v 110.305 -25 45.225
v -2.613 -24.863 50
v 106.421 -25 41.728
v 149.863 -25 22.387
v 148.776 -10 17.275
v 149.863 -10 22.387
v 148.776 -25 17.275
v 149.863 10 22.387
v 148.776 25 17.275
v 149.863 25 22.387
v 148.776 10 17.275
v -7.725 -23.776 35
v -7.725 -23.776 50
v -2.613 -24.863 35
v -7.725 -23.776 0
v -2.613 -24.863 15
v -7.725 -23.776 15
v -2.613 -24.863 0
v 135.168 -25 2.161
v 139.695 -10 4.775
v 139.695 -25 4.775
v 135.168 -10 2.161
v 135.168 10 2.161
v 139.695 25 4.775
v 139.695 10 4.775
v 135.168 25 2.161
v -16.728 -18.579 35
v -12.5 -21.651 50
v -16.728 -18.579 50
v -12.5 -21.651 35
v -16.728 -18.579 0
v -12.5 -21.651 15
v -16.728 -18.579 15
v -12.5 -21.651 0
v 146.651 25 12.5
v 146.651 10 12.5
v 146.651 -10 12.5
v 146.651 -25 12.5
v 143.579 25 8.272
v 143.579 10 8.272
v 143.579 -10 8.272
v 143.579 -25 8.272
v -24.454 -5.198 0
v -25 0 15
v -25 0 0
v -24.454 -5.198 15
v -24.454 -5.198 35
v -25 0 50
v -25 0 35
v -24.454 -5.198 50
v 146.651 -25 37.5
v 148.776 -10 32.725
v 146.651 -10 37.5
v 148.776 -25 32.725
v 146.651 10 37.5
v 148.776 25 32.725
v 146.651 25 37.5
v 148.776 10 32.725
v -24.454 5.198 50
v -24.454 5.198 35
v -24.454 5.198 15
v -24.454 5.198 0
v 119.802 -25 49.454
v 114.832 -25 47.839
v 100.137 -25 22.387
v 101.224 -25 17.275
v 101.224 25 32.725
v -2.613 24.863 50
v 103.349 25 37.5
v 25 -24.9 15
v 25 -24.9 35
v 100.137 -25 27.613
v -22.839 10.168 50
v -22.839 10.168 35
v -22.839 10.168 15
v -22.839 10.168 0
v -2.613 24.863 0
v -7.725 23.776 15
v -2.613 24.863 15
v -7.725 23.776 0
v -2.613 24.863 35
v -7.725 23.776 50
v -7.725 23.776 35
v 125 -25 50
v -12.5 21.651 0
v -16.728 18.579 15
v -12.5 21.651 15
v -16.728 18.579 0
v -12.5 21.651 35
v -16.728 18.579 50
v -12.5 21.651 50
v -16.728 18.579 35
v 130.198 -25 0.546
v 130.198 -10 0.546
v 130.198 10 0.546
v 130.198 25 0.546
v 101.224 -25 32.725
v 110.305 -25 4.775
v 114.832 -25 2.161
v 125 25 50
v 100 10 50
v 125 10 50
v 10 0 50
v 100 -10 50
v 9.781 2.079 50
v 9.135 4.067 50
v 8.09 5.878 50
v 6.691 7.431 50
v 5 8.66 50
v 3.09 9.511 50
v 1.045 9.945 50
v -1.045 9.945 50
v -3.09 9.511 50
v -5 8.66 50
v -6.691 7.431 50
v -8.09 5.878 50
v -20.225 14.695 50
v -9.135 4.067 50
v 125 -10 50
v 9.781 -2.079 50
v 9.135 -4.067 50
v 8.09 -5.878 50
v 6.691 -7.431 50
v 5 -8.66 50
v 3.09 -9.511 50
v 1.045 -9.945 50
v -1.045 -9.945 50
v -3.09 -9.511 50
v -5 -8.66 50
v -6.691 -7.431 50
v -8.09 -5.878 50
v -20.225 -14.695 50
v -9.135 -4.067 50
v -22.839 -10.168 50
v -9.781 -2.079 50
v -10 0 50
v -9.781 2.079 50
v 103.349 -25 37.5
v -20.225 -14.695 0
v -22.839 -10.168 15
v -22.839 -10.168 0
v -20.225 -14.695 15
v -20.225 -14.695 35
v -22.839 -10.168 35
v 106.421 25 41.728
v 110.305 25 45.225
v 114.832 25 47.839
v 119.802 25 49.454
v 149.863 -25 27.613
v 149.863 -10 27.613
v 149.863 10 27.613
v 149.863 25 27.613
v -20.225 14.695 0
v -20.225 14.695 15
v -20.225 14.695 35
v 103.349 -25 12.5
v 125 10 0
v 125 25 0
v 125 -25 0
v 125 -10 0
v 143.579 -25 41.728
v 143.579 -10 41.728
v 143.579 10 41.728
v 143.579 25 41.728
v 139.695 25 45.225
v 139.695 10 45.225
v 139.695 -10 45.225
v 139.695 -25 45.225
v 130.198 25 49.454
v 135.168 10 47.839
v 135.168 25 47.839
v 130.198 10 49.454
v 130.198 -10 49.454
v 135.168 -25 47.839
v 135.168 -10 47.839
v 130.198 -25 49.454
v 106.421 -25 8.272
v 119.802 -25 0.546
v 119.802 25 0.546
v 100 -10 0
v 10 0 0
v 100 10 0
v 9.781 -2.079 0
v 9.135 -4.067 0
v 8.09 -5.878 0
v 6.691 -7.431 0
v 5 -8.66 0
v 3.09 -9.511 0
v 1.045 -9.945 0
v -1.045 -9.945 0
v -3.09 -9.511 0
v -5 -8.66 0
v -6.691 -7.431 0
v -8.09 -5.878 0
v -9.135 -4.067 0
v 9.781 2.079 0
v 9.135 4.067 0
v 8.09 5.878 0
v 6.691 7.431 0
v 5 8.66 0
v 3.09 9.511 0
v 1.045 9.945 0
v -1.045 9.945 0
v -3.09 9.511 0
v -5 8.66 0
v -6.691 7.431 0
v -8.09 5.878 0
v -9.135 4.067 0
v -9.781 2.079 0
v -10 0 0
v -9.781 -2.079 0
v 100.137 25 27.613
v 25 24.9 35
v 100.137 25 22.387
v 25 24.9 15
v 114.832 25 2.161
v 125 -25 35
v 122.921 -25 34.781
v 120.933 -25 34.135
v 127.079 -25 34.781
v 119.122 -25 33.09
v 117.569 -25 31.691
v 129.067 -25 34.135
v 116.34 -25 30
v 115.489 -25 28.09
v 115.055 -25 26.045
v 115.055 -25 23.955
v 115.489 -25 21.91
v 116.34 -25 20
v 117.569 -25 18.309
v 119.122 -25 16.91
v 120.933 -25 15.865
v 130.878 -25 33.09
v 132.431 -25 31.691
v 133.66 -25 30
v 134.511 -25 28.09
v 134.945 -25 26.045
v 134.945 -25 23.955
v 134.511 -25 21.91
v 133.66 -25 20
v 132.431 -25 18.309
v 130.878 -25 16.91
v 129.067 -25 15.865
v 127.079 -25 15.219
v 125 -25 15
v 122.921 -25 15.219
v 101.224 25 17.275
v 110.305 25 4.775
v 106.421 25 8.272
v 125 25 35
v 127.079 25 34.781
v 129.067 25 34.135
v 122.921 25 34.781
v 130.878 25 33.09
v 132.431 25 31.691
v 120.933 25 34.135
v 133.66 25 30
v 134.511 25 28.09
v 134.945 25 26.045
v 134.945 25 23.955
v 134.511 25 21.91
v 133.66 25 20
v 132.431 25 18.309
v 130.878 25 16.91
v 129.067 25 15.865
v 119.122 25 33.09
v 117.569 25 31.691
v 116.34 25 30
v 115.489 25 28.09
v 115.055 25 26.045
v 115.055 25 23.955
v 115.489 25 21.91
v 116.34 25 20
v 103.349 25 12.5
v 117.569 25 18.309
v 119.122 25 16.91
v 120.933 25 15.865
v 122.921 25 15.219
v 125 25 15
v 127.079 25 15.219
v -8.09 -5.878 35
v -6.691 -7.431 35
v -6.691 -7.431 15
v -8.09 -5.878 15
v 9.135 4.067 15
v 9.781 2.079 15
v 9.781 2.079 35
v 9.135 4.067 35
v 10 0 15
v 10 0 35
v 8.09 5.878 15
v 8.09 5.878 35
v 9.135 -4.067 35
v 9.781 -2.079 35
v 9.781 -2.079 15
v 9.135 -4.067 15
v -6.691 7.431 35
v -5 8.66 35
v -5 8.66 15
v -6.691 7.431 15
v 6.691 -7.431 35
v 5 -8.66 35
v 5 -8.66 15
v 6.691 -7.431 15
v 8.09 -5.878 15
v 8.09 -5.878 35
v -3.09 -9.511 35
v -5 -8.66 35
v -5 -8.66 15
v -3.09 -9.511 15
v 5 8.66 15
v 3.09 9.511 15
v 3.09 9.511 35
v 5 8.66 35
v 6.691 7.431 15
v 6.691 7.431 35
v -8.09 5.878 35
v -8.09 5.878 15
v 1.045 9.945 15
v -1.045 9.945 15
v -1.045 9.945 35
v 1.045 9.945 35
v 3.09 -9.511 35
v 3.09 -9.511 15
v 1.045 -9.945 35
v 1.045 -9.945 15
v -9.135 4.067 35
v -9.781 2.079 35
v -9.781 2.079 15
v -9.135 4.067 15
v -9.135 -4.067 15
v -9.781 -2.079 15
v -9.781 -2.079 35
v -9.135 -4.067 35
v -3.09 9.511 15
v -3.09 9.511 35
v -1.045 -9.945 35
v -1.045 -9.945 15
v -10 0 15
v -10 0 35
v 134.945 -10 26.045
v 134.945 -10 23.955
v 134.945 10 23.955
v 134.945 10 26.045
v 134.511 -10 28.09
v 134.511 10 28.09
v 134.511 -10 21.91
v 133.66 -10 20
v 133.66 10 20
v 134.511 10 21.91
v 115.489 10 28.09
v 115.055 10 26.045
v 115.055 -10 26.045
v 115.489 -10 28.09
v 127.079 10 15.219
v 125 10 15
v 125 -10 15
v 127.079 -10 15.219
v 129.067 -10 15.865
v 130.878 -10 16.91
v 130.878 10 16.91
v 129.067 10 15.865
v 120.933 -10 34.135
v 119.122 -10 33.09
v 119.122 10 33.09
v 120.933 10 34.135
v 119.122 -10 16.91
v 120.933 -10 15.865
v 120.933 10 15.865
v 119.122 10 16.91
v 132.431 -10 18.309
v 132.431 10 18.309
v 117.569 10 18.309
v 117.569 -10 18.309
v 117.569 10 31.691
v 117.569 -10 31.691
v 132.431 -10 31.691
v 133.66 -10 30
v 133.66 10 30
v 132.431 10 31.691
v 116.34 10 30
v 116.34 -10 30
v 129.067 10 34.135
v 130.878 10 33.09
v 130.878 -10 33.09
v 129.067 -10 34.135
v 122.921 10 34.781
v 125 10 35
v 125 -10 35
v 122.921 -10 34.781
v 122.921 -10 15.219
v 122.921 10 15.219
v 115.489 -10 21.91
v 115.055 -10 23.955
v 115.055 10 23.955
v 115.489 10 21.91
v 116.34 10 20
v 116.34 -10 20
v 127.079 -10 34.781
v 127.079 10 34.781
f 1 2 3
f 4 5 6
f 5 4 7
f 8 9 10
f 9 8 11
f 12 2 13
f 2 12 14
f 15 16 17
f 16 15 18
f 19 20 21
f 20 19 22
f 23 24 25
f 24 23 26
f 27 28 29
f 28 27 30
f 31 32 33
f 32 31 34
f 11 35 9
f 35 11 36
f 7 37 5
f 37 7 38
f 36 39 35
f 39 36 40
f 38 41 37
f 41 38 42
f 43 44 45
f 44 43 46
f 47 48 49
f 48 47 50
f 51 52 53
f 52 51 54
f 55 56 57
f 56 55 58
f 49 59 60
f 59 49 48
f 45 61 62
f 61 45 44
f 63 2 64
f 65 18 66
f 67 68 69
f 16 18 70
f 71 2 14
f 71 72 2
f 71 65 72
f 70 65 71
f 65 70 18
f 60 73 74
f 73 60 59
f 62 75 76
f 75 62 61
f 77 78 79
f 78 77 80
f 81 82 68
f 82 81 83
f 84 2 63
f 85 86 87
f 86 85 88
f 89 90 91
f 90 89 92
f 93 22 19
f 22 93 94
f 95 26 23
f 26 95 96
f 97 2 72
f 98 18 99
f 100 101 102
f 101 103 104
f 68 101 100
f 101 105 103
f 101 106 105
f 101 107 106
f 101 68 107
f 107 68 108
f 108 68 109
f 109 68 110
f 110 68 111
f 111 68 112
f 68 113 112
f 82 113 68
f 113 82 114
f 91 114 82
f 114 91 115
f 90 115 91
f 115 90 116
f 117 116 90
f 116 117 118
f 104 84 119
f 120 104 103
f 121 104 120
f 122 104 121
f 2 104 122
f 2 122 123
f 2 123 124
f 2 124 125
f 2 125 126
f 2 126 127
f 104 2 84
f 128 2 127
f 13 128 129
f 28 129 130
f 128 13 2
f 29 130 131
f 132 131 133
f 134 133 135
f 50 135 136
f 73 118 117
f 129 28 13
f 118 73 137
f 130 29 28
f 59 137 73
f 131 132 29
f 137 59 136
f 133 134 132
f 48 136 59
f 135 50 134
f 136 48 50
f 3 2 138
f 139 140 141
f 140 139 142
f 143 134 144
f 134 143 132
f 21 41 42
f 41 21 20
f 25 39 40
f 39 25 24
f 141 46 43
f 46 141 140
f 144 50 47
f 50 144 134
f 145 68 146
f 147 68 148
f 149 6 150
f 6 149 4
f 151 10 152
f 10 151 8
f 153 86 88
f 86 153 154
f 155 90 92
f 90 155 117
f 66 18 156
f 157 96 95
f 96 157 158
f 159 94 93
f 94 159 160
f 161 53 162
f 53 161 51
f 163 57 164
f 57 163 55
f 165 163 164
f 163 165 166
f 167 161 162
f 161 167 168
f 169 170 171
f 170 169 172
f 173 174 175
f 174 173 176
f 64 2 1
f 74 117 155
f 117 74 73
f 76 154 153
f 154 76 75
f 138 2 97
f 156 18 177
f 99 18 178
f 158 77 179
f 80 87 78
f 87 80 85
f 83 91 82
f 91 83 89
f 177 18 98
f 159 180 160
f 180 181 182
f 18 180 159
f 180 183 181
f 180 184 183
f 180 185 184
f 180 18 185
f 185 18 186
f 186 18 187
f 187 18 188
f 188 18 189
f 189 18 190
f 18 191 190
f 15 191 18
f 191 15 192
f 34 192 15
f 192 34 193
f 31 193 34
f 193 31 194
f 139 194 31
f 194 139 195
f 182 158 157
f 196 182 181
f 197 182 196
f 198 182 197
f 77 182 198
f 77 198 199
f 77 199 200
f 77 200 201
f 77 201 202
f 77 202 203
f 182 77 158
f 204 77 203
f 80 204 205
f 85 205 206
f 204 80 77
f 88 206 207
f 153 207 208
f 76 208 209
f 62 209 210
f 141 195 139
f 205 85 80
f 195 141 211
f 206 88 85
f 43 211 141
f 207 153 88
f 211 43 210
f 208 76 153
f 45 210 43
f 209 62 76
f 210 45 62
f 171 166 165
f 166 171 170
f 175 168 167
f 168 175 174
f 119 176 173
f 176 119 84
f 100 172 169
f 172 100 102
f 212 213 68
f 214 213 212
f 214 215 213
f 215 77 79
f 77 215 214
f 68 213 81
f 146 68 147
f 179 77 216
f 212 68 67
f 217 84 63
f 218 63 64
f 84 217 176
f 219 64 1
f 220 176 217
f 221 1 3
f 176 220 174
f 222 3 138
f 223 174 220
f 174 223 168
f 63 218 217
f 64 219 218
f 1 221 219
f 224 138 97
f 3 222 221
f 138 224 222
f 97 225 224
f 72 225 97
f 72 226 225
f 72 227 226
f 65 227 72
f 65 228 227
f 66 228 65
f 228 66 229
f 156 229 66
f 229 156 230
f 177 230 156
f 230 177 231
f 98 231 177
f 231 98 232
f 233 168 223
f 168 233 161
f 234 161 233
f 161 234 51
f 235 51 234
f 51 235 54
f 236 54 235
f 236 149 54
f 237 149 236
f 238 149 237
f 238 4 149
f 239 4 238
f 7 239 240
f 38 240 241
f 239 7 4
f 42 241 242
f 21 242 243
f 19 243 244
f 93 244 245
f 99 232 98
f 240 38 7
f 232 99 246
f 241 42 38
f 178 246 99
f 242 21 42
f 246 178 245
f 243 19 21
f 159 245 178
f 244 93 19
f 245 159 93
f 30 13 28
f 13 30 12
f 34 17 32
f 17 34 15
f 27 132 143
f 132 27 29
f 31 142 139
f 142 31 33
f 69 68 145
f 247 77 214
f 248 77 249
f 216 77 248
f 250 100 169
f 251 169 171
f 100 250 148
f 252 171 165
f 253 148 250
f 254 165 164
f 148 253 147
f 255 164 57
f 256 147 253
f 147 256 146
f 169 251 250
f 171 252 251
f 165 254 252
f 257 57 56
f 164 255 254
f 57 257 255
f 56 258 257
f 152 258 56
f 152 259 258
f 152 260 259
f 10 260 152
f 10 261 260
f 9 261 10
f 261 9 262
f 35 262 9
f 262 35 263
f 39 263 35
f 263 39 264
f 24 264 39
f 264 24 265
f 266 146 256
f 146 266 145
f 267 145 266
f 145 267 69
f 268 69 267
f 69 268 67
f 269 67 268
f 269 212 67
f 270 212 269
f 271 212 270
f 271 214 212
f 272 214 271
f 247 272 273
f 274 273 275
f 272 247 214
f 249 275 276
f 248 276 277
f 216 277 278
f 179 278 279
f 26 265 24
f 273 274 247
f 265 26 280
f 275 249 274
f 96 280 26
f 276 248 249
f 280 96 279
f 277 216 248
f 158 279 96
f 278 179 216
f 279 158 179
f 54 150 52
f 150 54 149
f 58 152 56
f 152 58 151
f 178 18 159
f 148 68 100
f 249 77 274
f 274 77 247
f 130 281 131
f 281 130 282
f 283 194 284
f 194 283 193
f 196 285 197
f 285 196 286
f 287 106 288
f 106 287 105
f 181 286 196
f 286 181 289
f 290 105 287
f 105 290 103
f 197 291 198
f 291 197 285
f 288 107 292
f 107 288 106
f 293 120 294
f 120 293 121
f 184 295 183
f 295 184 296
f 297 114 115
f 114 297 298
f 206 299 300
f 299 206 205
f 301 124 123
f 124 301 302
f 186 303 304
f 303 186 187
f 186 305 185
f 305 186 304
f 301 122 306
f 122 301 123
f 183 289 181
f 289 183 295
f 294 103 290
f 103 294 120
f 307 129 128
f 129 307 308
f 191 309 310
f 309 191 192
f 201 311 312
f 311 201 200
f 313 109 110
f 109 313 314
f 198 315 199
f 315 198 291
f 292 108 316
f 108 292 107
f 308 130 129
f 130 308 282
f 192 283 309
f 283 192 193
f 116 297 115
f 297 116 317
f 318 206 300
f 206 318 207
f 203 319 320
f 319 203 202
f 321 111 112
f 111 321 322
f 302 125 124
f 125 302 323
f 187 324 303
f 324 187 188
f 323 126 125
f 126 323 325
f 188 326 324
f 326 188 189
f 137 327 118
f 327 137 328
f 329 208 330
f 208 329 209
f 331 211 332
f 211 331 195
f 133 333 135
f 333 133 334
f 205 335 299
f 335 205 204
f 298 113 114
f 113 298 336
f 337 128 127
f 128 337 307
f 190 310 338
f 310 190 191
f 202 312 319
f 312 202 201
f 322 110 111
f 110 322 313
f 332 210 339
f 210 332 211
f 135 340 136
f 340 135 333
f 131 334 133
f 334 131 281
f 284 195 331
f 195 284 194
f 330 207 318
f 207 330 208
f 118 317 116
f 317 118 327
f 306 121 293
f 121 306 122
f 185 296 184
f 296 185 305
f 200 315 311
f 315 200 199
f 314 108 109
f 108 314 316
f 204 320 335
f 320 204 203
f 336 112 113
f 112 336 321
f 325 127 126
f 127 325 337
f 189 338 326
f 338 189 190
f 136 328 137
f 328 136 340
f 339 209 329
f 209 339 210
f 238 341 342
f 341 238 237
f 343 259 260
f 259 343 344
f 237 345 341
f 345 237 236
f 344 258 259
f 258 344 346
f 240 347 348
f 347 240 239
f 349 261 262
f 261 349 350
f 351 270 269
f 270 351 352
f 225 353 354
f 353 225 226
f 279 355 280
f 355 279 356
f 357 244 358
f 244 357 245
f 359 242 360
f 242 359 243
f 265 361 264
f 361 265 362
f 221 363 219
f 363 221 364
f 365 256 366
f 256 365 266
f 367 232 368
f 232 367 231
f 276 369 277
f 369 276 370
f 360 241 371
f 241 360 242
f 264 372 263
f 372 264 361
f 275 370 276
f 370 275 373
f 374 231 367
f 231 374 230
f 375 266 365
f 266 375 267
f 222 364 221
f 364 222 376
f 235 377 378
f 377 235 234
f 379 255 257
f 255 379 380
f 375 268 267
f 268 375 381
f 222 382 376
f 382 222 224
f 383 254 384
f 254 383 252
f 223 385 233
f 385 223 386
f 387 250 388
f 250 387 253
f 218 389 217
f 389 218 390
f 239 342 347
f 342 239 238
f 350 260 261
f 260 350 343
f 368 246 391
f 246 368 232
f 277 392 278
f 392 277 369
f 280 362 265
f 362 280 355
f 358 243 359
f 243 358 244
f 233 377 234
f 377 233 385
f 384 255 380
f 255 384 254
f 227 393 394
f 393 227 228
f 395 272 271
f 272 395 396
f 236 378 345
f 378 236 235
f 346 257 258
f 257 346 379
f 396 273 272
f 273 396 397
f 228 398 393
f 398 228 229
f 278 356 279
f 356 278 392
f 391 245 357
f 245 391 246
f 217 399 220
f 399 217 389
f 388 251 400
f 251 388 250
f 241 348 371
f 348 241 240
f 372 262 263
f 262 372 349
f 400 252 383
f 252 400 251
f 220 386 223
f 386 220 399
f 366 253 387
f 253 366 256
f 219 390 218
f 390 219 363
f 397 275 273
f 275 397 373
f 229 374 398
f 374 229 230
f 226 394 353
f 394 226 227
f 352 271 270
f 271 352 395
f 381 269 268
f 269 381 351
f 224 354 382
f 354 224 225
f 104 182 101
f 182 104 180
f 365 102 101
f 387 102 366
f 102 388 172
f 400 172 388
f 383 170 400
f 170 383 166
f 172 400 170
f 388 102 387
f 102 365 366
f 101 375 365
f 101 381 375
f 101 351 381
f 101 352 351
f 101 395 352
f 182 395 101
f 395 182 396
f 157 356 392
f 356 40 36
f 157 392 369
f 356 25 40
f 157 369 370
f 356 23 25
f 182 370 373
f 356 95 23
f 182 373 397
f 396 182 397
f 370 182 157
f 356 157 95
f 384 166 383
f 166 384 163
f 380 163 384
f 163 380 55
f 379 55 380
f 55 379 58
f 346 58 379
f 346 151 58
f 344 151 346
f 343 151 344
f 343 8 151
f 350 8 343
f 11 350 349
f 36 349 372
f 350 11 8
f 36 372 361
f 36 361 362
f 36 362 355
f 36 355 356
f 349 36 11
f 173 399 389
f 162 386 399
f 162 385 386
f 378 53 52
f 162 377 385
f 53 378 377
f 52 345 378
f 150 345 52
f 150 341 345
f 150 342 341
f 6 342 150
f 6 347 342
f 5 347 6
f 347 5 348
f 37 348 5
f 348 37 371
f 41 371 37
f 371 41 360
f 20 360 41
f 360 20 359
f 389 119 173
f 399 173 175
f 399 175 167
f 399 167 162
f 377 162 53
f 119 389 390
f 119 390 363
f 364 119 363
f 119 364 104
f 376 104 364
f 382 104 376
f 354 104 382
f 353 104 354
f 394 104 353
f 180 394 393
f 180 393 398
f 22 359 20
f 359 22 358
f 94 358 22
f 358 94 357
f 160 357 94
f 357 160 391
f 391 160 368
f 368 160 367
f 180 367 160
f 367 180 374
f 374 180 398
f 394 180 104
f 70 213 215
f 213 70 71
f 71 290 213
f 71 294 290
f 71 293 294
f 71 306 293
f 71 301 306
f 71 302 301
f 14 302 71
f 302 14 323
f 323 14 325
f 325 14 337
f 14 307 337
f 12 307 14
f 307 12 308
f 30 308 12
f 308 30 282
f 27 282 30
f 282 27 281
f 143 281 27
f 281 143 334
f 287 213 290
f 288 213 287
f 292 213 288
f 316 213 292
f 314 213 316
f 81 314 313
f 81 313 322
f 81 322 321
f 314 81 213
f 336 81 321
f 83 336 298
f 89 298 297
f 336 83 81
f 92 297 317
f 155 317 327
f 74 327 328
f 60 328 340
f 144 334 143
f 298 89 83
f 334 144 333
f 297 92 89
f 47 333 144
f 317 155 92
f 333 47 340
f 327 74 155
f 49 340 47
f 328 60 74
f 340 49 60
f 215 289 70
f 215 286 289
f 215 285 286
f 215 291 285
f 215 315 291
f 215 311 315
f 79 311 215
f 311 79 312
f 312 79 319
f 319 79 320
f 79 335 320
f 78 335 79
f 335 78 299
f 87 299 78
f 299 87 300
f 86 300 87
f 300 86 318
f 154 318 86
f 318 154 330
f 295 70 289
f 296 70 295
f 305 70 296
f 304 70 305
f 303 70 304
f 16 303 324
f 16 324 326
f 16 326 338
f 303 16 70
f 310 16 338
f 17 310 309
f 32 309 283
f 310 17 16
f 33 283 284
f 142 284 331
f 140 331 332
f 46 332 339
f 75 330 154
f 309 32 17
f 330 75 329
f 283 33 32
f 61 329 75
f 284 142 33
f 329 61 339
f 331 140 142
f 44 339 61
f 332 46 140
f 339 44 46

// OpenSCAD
//Variables 
mainCylinderHeight = 50;
mainCylinderRadius = 25;
cylinderDiameterCut = 20;
lengthOfPart = 125;
heightcubeCut = 50;
widthCubeCut = 50;
depthCubeCut = 20;
offsetOfCube = 20;



difference(){
    hull(){
        cylinder(mainCylinderHeight, r = mainCylinderRadius, r = mainCylinderRadius);// main Cylinder

        translate([lengthOfPart, mainCylinderHeight / 2, mainCylinderHeight / 2])
        rotate([0, 90, -90])
        cylinder(mainCylinderHeight, r = mainCylinderRadius, r = mainCylinderRadius);// main Cylinder rotated and translated
    }
    
     cylinder(mainCylinderHeight, d = cylinderDiameterCut, d = cylinderDiameterCut);// main cut Cylinder 

        translate([lengthOfPart, mainCylinderHeight / 2, mainCylinderHeight / 2])
        rotate([0, 90, -90])
        cylinder(mainCylinderHeight,  d = cylinderDiameterCut,  d = cylinderDiameterCut);// main cut Cylinder rotated and translated
    
    
        translate([ lengthOfPart-mainCylinderRadius,-offsetOfCube / 2, 0])
        rotate([0, 0, 0])
        cube( [widthCubeCut,  depthCubeCut, widthCubeCut]);// cube cut  translated
        
        translate([ -mainCylinderRadius, -mainCylinderRadius, (mainCylinderHeight /2)-(offsetOfCube / 2)])
        rotate([ 0, 0, 0])
        cube( [ widthCubeCut ,widthCubeCut, depthCubeCut]);// main cube cut
}
